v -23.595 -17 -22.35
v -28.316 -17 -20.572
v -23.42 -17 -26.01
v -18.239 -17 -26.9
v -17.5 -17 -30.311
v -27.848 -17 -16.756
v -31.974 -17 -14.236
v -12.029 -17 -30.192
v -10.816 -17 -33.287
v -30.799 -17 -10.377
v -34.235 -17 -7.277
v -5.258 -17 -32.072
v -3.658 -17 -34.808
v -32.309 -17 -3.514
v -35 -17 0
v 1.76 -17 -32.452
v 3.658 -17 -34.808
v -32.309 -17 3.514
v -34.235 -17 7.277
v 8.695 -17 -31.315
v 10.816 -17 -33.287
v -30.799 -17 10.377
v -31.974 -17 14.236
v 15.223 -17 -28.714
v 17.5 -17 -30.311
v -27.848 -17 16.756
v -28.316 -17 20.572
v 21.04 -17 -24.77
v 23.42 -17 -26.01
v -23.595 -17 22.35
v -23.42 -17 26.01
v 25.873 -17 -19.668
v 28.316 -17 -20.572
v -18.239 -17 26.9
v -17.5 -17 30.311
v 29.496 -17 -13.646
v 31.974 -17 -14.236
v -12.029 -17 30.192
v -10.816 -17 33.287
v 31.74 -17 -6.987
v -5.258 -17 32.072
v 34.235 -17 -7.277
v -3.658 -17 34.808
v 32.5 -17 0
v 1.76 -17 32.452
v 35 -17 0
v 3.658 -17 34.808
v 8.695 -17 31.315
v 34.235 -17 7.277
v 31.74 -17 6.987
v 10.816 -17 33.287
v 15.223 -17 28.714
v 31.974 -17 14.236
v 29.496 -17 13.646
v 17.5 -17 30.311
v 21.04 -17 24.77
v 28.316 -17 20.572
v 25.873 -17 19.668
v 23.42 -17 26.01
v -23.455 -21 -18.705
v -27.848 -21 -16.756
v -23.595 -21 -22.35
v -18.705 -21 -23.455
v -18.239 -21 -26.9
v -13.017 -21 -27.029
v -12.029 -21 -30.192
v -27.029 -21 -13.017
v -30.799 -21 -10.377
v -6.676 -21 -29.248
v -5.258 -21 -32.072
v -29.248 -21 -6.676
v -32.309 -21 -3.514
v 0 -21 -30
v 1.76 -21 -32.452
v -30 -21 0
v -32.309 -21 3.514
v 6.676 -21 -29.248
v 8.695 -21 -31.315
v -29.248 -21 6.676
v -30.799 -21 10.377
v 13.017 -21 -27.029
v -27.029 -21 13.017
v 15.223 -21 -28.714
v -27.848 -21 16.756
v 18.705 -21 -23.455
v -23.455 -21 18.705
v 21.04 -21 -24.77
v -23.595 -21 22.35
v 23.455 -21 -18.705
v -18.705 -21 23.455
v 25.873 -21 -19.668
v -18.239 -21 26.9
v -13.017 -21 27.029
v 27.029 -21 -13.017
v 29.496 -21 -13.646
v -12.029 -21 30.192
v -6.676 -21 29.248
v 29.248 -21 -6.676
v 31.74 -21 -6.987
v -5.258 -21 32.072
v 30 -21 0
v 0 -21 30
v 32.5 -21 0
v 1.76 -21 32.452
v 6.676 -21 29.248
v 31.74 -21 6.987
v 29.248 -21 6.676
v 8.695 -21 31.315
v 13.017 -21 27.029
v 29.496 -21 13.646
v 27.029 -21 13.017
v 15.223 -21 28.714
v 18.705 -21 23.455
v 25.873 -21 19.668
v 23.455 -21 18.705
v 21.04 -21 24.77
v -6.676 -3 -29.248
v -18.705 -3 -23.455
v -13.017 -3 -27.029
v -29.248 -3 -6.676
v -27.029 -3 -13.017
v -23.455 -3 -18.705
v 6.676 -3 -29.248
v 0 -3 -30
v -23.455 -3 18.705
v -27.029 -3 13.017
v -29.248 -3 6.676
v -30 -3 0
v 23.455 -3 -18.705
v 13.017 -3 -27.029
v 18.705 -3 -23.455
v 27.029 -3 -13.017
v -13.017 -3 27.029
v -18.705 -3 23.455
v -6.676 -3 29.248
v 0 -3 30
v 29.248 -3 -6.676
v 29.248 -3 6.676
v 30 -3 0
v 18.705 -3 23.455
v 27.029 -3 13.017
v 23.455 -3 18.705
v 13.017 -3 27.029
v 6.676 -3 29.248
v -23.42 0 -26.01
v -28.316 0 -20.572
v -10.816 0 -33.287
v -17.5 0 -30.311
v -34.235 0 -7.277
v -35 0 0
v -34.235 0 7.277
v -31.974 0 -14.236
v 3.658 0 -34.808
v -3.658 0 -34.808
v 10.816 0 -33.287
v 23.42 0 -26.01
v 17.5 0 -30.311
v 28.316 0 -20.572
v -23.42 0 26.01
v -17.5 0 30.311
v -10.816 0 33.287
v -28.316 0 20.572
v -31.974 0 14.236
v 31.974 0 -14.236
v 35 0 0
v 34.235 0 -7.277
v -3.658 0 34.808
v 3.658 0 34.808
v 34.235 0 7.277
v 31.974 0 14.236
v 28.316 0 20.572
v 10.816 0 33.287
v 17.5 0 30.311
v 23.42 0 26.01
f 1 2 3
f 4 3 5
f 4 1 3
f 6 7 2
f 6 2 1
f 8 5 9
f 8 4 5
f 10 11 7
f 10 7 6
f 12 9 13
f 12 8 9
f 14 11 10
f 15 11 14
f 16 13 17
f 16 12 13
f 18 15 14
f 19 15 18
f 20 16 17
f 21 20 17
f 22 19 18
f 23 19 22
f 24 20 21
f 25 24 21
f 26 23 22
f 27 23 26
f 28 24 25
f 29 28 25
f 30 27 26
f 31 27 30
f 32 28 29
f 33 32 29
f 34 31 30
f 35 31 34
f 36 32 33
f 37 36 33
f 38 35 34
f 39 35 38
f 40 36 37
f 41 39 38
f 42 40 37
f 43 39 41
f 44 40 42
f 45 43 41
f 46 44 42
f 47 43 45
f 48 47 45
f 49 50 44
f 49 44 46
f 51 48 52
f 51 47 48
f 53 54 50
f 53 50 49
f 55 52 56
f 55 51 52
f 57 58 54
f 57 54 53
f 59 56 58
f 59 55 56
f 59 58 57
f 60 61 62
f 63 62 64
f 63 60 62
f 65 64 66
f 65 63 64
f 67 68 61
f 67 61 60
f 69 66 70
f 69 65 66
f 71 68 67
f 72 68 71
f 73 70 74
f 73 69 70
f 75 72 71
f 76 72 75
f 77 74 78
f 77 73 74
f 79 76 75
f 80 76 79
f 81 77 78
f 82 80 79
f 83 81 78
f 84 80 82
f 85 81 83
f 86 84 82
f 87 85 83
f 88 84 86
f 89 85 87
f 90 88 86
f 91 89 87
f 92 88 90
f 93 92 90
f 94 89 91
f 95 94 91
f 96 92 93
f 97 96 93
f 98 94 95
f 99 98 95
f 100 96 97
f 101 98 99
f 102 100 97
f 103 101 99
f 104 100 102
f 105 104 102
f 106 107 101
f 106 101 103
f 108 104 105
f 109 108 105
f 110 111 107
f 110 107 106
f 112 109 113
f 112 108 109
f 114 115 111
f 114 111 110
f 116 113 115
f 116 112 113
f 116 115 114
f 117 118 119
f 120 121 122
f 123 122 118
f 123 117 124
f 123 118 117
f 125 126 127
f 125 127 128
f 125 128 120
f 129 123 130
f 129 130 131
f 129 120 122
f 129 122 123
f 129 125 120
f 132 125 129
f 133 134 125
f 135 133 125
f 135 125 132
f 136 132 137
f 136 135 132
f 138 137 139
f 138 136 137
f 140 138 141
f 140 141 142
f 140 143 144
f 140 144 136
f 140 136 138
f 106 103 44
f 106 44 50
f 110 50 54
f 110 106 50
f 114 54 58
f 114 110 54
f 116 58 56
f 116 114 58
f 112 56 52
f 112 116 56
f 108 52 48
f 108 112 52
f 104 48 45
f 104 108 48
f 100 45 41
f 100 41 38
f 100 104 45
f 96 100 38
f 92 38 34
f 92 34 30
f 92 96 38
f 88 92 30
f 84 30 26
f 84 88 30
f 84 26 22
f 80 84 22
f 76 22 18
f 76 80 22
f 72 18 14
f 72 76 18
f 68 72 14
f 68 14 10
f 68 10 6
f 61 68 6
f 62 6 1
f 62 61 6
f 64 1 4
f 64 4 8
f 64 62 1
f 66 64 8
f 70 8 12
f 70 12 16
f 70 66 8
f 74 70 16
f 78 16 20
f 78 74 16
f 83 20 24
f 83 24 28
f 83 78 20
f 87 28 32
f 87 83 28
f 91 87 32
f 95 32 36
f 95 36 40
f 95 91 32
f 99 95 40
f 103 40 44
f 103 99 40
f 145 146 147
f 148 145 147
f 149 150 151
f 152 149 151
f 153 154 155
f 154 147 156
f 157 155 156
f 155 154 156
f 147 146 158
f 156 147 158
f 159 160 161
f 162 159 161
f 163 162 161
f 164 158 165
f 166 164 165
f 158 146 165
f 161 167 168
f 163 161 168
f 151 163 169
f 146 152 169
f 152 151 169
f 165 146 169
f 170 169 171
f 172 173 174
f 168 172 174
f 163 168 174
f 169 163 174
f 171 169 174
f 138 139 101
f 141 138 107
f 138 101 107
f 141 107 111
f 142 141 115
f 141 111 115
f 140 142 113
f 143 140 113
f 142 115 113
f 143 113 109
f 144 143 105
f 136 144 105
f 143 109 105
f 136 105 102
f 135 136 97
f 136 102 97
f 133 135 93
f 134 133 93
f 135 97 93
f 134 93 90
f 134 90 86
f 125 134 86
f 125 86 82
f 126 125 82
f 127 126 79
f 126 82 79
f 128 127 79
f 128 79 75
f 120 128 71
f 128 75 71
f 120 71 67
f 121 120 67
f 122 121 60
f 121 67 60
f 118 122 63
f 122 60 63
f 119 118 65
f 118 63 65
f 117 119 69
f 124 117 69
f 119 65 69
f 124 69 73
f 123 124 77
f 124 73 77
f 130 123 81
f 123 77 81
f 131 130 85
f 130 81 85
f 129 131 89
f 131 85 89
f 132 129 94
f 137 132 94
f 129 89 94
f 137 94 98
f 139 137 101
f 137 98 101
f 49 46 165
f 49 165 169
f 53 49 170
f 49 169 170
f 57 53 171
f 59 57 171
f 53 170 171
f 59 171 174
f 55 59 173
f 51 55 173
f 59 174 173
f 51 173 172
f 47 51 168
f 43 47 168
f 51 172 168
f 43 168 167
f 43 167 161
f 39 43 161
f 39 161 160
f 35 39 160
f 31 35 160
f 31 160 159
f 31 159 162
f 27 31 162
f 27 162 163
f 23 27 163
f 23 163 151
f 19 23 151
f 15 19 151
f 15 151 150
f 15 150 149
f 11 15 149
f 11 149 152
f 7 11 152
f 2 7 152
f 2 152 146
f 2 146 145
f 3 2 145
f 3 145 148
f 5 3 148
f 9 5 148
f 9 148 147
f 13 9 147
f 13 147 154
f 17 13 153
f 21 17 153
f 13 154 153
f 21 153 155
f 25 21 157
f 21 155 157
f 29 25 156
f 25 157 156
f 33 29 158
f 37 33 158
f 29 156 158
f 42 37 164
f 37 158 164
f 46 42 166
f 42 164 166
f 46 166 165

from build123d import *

# Parameters (mm, degrees)
F0_R     = 35
F1_DEPTH = 21
F2_R     = 30
F3_DEPTH = 18
F4_R     = 35
F4_R_2   = 32.5
F5_DEPTH = 4


with BuildPart() as f1:
    # F0 (on Front) → F1 (new body)
    with BuildSketch(Plane.XZ):
        Circle(F0_R)
    extrude(amount=F1_DEPTH)

    # F2 (on face) → F3 (cut)
    with BuildSketch(Plane.XZ.offset(21)):
        Circle(F2_R)
    extrude(amount=-F3_DEPTH, mode=Mode.SUBTRACT)

    # F4 (on face) → F5 (cut)
    with BuildSketch(Plane.XZ.offset(21)):
        Circle(F4_R)
        Circle(F4_R_2, mode=Mode.SUBTRACT)
    extrude(amount=-F5_DEPTH, mode=Mode.SUBTRACT)


solid = f1.part
